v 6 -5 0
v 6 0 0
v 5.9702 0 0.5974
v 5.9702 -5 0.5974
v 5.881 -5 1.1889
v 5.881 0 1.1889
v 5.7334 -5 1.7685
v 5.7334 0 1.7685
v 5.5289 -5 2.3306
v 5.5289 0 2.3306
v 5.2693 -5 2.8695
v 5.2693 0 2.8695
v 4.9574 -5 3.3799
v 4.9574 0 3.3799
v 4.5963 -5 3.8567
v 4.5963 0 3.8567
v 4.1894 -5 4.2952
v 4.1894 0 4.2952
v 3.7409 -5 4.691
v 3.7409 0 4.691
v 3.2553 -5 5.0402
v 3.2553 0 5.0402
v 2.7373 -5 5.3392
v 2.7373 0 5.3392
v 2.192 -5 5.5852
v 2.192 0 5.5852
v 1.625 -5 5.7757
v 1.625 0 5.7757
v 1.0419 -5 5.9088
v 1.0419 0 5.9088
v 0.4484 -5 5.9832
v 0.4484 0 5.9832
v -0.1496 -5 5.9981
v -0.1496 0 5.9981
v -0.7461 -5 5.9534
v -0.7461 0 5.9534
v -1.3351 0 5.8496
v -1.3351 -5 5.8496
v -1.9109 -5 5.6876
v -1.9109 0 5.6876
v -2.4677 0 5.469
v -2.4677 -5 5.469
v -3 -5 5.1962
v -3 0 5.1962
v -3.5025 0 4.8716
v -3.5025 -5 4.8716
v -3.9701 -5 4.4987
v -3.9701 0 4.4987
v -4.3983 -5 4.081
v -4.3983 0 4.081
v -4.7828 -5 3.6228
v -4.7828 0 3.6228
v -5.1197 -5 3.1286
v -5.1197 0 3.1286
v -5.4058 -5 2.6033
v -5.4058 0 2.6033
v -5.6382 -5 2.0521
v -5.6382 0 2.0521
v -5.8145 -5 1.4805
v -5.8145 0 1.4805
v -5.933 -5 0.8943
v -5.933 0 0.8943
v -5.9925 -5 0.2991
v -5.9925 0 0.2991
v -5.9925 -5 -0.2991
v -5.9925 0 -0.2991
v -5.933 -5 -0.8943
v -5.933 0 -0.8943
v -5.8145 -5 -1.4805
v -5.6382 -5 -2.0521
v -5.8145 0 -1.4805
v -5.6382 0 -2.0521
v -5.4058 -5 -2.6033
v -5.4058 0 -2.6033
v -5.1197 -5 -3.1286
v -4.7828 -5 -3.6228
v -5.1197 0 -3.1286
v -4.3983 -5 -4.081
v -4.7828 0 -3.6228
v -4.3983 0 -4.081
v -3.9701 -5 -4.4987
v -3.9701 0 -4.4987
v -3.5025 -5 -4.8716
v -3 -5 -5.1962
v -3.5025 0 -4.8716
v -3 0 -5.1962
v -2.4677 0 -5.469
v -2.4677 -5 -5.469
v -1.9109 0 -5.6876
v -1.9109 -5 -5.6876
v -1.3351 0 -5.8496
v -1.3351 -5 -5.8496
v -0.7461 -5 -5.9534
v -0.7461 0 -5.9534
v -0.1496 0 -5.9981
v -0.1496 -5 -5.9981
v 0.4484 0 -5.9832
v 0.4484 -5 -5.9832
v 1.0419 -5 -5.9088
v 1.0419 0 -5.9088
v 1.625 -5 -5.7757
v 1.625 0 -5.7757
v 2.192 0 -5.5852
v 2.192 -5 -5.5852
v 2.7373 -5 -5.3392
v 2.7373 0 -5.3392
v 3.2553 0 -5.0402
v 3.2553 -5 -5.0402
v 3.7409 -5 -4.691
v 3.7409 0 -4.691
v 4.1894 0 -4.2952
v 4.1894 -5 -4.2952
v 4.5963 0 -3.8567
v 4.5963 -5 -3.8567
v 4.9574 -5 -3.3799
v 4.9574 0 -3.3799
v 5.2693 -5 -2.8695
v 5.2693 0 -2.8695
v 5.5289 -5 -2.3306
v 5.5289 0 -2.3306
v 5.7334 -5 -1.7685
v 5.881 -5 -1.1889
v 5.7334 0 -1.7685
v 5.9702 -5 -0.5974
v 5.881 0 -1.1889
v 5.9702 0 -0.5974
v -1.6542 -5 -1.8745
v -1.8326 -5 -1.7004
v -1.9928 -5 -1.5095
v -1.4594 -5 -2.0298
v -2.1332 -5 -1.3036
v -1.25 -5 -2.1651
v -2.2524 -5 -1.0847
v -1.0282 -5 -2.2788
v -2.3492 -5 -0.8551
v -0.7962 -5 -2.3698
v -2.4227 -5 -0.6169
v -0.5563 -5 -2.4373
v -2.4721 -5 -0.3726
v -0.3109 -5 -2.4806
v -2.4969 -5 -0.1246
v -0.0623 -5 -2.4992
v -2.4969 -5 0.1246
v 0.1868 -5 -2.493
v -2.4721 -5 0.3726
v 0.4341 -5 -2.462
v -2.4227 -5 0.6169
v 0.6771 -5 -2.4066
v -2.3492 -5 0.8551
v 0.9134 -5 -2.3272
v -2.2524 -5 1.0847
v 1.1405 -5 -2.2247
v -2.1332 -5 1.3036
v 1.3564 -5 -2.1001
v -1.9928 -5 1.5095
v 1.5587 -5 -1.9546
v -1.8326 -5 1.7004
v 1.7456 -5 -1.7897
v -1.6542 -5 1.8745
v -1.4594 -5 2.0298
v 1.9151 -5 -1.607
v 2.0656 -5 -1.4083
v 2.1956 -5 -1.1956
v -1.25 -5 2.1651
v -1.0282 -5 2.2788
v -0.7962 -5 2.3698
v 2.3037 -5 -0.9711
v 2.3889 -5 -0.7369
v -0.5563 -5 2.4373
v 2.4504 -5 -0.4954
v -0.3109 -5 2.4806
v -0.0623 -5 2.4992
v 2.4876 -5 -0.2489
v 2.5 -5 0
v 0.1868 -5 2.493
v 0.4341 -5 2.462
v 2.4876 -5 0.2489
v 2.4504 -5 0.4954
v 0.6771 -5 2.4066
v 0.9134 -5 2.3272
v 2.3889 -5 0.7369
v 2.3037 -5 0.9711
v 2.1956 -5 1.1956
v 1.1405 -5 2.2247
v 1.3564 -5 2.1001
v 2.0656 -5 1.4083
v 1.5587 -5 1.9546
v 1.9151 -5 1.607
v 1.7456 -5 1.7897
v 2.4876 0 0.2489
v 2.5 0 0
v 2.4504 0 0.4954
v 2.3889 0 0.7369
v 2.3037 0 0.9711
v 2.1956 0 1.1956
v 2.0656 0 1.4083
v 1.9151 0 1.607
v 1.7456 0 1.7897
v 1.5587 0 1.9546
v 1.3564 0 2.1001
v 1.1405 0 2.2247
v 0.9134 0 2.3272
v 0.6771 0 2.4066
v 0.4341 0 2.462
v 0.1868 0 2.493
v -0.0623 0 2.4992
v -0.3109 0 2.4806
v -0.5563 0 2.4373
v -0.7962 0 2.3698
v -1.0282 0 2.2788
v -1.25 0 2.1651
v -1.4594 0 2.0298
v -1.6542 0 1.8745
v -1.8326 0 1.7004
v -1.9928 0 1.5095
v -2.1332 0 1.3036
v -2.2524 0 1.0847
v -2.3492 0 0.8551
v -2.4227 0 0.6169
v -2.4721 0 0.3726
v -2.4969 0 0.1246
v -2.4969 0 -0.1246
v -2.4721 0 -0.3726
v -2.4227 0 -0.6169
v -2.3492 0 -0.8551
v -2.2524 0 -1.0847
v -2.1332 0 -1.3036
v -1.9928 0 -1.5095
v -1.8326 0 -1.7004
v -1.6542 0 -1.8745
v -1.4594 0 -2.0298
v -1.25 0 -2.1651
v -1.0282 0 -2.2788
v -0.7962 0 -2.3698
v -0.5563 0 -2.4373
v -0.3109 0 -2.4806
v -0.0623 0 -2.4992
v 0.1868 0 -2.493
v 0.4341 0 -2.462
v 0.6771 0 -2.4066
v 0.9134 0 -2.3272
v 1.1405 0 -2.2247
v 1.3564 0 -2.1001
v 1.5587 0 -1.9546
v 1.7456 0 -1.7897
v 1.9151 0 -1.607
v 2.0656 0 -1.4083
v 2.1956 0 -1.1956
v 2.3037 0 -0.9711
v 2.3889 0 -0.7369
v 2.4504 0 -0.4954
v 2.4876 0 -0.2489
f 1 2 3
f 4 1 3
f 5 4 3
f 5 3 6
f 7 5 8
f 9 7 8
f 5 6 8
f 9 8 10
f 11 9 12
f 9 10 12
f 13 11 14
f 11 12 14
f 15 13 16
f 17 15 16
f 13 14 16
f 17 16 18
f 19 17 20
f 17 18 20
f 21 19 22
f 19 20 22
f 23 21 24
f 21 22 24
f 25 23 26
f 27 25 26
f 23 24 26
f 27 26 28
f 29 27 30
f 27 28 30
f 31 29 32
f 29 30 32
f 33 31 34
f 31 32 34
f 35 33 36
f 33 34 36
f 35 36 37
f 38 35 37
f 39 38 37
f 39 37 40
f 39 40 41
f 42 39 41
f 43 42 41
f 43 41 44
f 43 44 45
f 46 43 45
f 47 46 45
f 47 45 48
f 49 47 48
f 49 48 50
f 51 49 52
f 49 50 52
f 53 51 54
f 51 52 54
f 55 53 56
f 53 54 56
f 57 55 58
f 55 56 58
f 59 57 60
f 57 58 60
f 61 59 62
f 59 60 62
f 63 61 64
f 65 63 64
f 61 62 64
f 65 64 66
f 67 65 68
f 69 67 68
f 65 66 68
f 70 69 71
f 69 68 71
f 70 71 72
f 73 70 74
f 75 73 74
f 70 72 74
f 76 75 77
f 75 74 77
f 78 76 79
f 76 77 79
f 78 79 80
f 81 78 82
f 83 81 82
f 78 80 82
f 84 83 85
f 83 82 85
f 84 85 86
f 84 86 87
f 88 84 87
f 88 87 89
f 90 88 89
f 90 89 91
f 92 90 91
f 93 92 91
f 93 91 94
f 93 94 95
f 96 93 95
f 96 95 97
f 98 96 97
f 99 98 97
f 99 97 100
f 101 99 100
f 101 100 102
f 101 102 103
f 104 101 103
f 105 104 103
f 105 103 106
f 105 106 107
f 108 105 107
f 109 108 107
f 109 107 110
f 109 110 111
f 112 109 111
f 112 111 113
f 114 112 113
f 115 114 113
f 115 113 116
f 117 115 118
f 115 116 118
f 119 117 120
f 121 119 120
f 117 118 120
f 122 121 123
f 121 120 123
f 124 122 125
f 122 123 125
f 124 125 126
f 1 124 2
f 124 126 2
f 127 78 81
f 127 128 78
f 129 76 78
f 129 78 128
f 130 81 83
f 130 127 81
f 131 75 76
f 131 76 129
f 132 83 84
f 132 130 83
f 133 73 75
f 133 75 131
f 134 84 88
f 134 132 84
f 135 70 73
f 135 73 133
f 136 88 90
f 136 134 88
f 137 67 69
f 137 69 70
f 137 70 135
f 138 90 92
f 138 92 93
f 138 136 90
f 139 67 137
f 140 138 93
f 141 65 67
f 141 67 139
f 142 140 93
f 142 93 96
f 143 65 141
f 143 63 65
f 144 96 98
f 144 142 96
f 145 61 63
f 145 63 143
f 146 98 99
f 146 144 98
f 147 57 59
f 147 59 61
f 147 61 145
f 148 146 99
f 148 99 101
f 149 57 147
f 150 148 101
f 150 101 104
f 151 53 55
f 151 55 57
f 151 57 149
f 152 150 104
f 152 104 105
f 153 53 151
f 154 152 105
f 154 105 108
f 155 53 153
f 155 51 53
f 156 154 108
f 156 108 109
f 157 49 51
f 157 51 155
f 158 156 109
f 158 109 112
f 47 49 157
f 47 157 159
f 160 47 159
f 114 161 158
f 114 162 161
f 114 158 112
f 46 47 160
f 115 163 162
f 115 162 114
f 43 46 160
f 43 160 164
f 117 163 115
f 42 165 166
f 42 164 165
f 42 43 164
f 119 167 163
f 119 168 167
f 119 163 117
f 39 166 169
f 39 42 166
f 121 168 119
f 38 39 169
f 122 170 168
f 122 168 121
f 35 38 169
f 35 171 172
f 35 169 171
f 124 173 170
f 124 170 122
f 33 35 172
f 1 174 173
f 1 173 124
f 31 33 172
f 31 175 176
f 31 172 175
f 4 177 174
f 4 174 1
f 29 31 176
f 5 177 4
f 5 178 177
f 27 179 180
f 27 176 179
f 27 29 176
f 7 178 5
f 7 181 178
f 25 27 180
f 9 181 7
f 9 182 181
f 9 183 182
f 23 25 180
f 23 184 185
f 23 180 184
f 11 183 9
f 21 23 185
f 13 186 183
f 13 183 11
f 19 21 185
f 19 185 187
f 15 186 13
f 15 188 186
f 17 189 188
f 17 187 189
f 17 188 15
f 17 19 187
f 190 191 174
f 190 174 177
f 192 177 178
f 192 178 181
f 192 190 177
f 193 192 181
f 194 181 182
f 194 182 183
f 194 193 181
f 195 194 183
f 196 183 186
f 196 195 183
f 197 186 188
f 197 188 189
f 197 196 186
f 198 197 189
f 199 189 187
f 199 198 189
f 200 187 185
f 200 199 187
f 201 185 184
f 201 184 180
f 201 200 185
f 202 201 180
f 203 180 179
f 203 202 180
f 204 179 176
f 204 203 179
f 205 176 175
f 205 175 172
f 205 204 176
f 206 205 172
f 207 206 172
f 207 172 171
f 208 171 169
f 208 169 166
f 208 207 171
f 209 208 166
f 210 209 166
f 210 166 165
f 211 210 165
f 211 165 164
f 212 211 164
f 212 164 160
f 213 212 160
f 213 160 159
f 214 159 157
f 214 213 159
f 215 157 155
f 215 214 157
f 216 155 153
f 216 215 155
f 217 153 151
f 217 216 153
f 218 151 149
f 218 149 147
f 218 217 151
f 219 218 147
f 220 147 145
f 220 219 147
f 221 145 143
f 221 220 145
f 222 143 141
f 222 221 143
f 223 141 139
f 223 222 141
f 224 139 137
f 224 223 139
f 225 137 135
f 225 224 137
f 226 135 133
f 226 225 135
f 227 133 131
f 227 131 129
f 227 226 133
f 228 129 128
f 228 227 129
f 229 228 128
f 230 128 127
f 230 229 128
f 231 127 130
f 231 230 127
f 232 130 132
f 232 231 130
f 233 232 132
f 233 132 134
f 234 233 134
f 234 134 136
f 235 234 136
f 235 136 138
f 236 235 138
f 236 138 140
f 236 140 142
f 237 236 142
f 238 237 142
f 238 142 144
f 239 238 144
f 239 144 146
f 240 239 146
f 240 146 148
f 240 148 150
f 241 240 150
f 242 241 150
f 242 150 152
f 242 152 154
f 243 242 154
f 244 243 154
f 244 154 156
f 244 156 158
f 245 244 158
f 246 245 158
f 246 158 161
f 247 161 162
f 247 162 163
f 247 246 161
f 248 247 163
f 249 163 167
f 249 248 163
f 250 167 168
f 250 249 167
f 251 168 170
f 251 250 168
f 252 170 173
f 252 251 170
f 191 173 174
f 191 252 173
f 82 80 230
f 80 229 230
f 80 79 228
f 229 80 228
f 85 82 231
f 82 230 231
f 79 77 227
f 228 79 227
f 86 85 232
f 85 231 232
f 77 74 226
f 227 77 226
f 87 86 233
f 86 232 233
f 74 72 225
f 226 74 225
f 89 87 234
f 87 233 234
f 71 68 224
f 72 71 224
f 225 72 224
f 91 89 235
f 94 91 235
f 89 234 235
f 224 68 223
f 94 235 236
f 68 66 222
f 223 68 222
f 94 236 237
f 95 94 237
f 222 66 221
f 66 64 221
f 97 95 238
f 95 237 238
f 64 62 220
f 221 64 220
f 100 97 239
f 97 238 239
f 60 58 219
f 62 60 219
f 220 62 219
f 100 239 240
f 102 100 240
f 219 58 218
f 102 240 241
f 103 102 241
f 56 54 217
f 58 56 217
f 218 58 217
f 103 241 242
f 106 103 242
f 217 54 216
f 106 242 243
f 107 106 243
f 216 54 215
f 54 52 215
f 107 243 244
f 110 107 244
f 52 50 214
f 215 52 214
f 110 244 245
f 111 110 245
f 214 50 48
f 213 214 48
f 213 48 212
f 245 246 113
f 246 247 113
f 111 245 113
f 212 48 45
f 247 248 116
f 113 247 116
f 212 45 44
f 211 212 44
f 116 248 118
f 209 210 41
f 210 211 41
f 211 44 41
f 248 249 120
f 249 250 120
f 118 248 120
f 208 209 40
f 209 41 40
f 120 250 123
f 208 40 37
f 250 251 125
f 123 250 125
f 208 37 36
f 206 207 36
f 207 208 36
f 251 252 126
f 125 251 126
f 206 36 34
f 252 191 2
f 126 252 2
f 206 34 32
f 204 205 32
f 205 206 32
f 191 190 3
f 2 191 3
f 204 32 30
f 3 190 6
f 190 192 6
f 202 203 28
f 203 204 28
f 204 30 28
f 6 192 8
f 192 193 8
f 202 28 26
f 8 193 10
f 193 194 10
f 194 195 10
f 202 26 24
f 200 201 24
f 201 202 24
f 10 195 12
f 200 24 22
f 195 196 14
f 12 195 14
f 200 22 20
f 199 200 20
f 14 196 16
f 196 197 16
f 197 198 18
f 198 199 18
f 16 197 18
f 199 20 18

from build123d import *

# Parameters (mm, degrees)
F0_R     = 6
F0_R_2   = 2.5
F1_DEPTH = 5


with BuildPart() as f1:
    # F0 (on Front) → F1 (new body)
    with BuildSketch(Plane.XZ):
        Circle(F0_R)
        Circle(F0_R_2, mode=Mode.SUBTRACT)
    extrude(amount=F1_DEPTH)


with BuildPart() as f2_1:
    # F2: copy of F1
    add(f1.part)


solid = f1.part
